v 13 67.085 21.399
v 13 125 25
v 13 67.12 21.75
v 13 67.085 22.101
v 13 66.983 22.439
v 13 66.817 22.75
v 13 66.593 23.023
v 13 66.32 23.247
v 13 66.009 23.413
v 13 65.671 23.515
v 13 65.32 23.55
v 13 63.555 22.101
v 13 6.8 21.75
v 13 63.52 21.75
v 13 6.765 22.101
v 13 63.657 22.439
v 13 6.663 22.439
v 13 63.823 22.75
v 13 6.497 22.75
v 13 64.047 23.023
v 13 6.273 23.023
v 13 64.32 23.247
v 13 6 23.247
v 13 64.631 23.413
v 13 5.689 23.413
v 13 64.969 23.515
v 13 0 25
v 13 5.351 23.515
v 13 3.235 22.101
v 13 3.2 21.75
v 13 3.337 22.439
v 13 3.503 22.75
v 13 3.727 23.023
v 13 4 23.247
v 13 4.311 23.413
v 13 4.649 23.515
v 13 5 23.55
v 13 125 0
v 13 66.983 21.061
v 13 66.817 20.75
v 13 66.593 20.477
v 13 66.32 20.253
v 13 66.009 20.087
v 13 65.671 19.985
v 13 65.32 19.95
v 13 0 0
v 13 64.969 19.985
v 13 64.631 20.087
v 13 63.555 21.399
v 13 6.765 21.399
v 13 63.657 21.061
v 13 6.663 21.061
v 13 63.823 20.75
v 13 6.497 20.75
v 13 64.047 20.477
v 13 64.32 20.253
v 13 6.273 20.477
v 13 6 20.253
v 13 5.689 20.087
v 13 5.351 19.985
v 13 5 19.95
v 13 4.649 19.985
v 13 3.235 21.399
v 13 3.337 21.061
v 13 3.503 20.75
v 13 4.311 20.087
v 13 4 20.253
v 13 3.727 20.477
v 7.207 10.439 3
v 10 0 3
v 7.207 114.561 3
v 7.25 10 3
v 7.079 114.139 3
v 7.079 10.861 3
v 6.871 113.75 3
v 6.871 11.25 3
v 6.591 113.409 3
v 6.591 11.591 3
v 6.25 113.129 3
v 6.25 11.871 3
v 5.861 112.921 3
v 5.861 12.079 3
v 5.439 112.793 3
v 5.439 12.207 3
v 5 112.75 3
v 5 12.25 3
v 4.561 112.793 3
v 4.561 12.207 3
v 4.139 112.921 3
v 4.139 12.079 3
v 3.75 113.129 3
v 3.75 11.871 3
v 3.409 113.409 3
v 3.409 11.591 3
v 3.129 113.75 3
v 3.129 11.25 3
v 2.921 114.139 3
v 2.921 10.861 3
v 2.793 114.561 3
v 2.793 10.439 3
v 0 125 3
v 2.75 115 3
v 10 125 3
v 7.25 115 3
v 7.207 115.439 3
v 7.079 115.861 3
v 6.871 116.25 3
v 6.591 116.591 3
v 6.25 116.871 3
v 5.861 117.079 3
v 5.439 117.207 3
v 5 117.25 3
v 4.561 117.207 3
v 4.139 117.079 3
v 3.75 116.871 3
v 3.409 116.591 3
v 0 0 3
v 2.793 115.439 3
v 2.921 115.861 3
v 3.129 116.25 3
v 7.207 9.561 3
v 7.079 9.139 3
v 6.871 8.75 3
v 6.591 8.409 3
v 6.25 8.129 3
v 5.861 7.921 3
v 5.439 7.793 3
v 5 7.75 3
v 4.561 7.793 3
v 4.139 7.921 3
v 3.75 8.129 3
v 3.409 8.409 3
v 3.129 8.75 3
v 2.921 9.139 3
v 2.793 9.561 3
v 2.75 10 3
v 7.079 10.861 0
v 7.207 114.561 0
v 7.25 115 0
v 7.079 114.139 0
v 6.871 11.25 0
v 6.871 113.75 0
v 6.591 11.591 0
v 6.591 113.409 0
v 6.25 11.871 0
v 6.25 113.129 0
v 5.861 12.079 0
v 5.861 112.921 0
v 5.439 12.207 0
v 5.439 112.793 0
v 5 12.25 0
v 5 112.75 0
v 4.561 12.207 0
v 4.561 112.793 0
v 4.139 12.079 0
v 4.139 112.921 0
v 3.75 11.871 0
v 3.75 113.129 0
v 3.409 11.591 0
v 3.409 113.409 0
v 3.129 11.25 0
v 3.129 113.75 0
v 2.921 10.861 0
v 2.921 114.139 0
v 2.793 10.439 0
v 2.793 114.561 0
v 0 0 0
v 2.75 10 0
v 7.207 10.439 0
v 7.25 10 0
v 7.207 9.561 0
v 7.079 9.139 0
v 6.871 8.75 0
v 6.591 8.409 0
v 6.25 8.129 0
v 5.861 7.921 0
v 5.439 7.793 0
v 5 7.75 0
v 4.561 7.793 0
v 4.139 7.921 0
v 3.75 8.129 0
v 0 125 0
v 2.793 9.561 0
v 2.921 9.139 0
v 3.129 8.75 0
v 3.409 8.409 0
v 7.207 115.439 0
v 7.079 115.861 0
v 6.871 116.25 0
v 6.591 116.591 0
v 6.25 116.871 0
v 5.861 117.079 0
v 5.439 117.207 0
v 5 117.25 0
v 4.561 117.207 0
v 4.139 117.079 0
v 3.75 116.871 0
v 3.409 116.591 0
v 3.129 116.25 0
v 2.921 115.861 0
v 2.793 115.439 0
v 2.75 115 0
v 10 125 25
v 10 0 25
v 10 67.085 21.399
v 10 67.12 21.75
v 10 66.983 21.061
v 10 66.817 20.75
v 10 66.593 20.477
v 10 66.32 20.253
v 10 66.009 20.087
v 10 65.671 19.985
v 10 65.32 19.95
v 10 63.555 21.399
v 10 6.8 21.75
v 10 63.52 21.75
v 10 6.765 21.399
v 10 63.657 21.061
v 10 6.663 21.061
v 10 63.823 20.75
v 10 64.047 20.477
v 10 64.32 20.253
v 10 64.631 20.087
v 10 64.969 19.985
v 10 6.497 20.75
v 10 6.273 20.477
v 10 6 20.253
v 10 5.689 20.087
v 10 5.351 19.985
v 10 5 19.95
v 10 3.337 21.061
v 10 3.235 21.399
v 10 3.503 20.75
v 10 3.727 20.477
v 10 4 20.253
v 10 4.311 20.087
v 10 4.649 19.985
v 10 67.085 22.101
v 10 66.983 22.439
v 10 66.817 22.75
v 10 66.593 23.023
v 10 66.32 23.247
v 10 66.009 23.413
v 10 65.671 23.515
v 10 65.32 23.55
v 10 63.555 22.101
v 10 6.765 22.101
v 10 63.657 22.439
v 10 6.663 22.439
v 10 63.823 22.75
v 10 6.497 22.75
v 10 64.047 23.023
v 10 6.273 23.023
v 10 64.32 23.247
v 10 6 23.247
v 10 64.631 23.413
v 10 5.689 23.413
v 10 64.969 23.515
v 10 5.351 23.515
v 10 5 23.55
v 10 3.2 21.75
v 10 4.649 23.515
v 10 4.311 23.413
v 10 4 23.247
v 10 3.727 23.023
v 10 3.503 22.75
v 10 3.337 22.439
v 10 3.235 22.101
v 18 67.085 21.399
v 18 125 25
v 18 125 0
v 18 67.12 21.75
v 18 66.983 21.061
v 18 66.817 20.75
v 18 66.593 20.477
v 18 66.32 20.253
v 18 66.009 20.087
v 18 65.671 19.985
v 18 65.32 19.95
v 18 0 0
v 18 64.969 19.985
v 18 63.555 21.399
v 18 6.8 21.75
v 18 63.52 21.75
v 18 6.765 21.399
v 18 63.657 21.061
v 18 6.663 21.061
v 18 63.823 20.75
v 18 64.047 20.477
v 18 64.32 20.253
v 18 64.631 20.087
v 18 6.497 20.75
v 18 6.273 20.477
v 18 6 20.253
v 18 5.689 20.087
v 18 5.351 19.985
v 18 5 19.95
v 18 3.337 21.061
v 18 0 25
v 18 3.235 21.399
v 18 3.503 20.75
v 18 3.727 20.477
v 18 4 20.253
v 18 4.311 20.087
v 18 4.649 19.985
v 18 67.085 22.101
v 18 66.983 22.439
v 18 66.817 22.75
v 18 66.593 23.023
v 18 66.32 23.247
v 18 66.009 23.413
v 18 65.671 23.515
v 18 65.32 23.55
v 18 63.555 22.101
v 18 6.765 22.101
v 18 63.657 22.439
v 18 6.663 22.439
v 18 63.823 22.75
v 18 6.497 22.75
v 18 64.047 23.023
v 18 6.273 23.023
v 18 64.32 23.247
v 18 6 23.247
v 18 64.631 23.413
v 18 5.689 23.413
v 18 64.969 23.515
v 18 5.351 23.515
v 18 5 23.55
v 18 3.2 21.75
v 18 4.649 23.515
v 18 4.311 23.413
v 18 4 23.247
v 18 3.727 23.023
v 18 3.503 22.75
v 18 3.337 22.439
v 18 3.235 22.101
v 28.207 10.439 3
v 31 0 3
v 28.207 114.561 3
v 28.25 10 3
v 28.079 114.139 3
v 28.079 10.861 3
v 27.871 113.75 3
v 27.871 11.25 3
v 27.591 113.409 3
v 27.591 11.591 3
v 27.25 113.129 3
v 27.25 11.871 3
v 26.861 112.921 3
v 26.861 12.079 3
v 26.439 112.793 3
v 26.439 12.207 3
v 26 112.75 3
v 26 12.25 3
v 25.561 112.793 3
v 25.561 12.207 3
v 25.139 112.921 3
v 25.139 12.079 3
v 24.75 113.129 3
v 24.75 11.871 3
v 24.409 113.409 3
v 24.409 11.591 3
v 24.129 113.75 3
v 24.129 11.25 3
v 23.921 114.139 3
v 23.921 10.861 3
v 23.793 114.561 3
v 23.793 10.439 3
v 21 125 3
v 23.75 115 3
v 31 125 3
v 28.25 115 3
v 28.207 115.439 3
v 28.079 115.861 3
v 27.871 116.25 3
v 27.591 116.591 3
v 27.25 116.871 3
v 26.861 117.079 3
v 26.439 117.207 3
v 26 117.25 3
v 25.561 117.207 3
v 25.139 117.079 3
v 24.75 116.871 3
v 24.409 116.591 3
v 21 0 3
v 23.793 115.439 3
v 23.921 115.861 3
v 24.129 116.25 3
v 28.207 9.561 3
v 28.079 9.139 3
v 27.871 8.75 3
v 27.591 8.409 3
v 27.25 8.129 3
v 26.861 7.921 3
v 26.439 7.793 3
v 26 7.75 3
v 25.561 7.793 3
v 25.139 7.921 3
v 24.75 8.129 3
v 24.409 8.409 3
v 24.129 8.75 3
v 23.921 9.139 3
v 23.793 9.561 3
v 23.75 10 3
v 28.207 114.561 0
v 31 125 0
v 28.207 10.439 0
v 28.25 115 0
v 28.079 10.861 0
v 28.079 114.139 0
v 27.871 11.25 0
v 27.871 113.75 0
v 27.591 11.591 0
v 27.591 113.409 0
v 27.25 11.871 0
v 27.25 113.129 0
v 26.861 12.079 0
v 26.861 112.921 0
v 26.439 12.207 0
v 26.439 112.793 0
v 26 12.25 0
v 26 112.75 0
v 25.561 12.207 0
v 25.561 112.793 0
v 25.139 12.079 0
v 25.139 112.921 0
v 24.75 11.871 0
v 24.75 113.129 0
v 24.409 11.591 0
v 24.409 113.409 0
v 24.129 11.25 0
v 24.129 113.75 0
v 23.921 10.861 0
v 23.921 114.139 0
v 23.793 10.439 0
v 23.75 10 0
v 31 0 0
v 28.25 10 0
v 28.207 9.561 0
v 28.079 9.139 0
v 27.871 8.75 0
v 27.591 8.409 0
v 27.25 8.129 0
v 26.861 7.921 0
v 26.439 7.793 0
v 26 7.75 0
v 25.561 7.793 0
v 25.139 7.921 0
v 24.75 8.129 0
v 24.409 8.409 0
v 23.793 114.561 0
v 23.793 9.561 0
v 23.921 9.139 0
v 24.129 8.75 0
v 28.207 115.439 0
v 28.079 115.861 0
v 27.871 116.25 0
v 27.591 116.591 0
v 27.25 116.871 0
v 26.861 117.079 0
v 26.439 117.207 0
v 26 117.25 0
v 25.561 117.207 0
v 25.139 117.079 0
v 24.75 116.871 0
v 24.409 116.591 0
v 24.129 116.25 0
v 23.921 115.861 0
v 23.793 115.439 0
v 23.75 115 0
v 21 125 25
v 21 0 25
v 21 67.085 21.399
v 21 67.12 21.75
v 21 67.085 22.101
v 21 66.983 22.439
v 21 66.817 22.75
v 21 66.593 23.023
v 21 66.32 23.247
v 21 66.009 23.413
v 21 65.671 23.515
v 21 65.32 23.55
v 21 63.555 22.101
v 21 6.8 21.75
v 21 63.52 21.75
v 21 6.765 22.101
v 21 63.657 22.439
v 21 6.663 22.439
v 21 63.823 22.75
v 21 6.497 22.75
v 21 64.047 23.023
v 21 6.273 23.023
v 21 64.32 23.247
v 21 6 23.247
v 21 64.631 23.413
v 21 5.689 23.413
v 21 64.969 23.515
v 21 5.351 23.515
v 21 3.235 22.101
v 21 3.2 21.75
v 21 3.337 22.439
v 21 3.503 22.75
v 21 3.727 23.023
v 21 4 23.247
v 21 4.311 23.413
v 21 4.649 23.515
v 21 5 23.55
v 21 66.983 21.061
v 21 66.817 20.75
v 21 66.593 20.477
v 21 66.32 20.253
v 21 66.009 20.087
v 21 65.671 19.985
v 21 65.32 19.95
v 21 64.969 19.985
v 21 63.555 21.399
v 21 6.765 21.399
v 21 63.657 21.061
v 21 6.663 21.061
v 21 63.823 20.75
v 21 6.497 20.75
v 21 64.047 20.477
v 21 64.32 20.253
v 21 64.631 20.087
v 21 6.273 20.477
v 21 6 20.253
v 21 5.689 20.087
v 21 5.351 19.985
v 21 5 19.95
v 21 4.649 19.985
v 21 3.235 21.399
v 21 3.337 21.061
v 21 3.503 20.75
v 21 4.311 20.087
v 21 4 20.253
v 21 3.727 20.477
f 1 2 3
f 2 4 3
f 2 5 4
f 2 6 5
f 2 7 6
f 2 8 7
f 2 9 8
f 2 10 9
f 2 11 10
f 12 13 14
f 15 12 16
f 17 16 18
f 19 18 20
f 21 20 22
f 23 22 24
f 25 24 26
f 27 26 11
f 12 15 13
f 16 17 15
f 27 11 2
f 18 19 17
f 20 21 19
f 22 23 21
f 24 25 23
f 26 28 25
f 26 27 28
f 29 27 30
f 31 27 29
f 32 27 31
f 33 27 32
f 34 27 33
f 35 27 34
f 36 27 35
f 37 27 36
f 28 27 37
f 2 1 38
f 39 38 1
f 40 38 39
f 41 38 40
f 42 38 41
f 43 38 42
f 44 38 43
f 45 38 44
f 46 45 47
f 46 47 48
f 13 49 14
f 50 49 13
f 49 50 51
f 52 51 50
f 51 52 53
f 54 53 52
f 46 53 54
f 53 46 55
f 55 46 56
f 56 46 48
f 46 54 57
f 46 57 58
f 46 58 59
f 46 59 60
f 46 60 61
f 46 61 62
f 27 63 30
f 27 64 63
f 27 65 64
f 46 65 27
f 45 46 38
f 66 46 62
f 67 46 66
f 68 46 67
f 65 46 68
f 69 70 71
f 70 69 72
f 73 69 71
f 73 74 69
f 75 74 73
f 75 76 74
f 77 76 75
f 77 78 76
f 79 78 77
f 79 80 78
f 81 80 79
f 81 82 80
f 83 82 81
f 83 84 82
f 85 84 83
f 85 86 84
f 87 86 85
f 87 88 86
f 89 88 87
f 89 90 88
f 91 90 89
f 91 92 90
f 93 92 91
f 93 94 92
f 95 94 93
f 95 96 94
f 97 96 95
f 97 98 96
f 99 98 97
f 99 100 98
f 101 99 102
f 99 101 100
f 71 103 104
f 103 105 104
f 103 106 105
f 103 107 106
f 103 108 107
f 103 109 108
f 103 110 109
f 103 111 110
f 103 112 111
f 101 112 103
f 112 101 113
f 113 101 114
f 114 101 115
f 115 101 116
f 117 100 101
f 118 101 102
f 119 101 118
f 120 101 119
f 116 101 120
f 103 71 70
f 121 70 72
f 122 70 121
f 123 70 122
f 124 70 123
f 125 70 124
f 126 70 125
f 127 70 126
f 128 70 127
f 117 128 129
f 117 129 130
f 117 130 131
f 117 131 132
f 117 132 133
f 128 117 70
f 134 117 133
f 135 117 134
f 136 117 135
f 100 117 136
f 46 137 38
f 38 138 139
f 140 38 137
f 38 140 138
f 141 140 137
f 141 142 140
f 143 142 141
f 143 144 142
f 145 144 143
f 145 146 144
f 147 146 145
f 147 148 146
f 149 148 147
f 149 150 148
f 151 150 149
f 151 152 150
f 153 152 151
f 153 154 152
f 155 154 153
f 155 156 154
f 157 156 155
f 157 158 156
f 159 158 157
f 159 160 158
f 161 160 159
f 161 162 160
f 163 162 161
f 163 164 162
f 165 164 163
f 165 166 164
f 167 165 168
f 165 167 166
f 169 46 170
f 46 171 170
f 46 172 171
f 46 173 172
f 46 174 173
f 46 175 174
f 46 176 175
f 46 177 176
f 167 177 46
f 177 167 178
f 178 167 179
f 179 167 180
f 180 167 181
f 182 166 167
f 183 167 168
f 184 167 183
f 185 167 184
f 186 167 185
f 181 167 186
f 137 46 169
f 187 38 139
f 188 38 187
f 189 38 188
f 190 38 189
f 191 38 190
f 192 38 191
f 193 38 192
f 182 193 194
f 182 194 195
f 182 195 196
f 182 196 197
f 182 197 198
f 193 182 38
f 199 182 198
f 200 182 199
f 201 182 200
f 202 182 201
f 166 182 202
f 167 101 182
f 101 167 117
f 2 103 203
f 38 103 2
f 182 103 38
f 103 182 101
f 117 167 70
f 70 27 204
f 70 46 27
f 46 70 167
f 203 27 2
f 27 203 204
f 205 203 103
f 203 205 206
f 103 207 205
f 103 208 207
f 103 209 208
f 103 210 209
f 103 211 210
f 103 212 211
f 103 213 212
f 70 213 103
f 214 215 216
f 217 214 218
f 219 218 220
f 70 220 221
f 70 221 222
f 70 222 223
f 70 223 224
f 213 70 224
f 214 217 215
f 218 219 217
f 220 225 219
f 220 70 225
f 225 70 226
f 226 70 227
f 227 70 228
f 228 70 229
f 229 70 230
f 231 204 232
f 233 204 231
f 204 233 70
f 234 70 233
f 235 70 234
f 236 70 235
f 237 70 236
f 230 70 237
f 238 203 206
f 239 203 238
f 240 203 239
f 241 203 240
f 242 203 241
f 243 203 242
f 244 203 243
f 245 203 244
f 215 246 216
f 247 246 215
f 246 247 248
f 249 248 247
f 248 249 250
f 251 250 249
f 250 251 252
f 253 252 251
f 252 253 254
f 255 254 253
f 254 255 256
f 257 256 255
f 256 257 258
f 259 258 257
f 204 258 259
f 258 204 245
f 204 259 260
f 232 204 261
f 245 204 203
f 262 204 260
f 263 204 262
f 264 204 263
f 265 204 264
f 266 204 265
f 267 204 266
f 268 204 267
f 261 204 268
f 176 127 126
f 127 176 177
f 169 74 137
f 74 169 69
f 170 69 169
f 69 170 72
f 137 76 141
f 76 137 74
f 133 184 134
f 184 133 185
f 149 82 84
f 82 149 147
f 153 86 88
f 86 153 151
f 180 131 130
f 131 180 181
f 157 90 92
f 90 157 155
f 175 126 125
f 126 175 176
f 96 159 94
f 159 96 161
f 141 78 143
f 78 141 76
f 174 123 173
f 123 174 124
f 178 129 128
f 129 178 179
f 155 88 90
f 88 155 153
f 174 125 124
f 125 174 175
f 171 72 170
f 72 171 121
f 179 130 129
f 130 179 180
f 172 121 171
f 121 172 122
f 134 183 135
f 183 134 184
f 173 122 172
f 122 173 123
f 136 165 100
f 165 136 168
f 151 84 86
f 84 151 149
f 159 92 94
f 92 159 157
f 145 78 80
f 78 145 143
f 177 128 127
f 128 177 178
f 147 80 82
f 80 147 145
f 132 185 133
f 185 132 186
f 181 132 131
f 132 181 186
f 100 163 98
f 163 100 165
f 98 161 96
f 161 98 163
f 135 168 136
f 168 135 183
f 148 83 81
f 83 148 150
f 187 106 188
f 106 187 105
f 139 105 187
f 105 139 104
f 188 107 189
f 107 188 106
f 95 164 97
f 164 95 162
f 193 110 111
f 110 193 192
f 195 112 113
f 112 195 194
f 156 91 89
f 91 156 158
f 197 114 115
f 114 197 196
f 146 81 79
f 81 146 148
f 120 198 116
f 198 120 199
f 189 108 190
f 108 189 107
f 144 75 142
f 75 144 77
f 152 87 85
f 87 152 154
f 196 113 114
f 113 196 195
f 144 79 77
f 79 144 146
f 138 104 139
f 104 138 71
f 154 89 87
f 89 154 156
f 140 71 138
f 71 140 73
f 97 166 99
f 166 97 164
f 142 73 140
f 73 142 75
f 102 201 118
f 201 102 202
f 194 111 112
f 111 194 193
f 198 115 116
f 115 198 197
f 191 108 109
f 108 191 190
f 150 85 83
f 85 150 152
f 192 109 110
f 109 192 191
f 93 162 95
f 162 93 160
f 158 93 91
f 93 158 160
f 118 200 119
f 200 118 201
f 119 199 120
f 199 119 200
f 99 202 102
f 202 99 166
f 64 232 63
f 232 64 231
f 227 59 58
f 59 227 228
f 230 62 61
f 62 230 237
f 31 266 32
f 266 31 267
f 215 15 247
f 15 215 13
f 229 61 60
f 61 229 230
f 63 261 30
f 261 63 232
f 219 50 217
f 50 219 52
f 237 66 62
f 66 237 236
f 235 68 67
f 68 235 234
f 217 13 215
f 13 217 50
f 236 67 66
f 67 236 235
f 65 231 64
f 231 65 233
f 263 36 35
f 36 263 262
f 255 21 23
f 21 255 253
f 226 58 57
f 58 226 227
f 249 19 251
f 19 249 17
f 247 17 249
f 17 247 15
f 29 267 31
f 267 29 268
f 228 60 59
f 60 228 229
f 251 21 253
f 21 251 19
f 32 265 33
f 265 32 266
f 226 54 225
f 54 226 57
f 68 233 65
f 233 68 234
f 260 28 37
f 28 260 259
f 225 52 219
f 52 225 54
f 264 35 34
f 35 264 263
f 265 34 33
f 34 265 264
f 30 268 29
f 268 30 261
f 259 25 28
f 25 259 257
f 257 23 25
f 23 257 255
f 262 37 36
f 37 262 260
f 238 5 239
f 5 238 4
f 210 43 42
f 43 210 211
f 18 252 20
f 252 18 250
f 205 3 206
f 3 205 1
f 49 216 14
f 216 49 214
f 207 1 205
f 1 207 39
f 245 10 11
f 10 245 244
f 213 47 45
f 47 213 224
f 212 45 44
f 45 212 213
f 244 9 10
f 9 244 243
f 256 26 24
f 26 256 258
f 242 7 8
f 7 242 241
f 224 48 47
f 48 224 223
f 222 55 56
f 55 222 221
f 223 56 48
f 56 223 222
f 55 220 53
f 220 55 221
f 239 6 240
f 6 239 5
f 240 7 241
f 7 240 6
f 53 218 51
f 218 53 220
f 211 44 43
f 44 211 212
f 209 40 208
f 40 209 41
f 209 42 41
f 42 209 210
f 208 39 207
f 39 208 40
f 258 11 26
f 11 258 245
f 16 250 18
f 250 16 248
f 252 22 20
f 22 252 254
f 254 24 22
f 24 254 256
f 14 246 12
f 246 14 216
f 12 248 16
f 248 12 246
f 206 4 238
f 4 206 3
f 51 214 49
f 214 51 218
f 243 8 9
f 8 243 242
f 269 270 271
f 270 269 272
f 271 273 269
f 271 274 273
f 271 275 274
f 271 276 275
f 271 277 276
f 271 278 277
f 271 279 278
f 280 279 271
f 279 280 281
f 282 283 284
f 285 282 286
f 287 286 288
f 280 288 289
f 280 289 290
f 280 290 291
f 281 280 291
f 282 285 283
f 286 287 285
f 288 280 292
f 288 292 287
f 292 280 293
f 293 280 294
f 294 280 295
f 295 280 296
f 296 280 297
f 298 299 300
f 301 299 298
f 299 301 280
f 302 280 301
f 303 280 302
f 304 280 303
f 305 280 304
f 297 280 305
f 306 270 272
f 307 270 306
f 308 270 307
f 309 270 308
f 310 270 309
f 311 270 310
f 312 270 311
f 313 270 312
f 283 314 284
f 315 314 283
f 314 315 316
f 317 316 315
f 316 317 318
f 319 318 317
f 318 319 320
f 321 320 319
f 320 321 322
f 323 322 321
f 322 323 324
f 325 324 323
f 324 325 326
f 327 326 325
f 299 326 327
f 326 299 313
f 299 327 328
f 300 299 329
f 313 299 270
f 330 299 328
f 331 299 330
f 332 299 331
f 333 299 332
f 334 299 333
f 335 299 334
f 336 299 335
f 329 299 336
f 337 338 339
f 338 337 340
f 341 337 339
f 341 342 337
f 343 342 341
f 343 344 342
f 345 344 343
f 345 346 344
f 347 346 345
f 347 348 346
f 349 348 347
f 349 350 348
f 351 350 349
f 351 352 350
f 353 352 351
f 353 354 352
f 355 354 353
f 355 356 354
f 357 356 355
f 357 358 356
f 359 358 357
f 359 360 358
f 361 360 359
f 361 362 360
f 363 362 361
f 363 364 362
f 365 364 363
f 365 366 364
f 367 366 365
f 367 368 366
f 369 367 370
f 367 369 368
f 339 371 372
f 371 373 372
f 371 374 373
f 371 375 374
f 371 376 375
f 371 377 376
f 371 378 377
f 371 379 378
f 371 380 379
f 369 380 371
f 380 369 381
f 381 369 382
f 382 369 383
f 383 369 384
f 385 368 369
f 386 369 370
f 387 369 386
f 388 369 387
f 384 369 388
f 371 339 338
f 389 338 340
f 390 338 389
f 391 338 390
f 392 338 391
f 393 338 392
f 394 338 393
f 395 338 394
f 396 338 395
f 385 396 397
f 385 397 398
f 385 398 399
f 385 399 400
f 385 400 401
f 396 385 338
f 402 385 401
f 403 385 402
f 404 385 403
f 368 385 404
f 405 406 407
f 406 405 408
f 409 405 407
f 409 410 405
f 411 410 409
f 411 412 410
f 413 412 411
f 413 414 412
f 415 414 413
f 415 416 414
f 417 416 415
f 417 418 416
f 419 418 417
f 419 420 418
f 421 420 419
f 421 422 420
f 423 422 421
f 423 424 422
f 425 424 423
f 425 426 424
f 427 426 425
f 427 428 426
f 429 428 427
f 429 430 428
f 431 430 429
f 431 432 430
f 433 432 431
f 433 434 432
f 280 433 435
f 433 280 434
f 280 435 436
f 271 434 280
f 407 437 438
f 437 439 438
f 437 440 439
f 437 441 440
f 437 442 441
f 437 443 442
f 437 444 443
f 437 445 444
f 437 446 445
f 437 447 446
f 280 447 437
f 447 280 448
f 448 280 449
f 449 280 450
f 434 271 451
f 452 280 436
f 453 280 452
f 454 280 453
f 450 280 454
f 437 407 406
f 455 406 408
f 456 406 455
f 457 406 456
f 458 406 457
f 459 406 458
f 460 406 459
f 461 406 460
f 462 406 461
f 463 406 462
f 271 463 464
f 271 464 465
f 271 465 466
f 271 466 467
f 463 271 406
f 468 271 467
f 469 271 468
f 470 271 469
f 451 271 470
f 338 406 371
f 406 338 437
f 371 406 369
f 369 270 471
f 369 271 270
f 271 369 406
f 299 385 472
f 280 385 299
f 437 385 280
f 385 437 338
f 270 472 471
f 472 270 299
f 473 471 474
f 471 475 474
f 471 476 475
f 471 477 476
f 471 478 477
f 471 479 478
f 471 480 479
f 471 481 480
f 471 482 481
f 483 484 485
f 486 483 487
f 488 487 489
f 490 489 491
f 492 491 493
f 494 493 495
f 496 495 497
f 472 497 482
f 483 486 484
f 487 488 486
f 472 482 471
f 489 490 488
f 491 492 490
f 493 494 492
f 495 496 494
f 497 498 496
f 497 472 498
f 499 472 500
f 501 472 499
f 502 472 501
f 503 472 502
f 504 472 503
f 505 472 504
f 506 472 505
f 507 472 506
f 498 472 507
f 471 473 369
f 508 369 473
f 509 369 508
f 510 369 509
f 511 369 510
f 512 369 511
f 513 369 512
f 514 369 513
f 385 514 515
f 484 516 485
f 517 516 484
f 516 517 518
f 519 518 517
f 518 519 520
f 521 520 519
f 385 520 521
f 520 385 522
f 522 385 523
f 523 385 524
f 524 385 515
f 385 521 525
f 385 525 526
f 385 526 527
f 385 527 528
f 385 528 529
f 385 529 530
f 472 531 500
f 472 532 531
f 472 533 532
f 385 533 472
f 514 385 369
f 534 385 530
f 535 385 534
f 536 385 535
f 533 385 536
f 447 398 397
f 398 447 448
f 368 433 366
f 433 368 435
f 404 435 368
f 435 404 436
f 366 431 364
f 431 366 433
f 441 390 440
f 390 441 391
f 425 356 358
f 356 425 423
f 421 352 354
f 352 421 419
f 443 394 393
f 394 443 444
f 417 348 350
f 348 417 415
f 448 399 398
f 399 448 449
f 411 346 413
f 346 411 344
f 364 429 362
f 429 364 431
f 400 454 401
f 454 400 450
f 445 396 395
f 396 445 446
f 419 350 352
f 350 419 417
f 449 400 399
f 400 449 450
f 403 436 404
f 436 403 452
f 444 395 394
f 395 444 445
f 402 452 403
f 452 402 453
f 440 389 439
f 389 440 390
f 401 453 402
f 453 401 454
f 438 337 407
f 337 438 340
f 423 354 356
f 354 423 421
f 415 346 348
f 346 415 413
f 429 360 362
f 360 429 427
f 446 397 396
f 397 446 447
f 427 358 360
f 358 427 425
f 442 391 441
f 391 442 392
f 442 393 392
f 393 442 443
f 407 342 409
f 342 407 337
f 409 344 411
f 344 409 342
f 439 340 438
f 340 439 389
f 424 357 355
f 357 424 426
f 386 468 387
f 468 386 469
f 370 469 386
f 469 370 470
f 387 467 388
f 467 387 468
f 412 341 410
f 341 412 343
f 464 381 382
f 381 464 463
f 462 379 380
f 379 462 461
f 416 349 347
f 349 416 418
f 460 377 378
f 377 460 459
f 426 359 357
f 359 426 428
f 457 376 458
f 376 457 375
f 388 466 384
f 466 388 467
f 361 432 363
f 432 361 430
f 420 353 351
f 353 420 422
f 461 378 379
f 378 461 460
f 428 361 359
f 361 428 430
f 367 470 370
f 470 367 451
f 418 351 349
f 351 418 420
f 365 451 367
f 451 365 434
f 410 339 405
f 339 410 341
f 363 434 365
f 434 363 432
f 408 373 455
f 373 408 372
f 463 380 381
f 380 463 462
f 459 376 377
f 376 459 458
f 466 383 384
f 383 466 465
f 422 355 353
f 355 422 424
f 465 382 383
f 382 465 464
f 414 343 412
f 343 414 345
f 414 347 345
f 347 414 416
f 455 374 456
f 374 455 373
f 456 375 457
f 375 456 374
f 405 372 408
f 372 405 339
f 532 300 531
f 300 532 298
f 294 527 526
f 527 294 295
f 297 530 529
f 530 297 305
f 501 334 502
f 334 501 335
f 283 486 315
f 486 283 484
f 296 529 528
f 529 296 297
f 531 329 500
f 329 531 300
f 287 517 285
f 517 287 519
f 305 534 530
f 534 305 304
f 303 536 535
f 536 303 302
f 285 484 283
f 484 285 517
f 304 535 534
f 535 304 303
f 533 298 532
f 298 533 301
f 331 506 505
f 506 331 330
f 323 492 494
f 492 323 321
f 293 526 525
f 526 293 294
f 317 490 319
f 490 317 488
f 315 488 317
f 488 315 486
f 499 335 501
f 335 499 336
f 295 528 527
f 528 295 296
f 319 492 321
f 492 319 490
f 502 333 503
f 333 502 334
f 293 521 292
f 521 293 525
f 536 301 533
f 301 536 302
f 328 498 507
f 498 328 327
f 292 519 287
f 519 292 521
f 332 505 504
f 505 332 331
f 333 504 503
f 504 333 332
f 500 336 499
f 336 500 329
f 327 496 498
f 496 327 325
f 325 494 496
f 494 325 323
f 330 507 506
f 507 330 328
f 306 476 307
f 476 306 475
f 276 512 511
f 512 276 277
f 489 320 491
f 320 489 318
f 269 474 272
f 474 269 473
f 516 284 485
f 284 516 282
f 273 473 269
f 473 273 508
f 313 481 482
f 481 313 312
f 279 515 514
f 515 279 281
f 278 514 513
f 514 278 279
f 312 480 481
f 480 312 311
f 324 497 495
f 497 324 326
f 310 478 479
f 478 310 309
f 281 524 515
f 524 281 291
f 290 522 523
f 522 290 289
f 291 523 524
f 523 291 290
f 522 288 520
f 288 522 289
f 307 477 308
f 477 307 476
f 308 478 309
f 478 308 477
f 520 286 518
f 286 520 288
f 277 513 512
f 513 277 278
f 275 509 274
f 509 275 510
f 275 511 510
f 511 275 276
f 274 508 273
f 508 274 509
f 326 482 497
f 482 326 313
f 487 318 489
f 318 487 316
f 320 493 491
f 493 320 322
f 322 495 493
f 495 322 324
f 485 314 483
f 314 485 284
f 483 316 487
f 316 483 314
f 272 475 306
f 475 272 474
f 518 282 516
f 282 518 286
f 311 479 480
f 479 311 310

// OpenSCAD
// NCASE M1 HDD Bracket for 3.5" HDD
// 2ピース構成（左右の耳型ブラケット）
// ケースへの取り付け: M4 Flat Head
// HDDの取り付け: #6-32 pan head w/shoulder

// ========================================
// パラメータ定義
// ========================================

// 3.5" HDD 標準寸法
hdd_width = 101.6;      // HDDの幅
hdd_height = 26.1;      // HDDの高さ
hdd_length = 146;       // HDDの長さ

// HDD側面ネジ穴位置 (#6-32)
// 底面から6.35mm、前面からの距離
hdd_screw_height_from_bottom = 6.35;        // HDDの底面からネジ穴までの高さ
hdd_screw_positions = [41.28, 76.20, 101.60]; // 前面からの距離（3箇所）

// HDDの向き設定（ラベル面を外側に向ける場合はtrue）
hdd_label_side_out = true;

// ネジ穴のZ軸オフセット（微調整用）
hdd_screw_z_offset = 2;                     // Z軸方向に追加のオフセット（mm）

// 実際のネジ穴高さを計算
// ラベル面を外側にする場合、HDDを上下逆にするのでネジ穴の高さが変わる
hdd_screw_height = hdd_label_side_out
    ? (hdd_height - hdd_screw_height_from_bottom + hdd_screw_z_offset)  // 逆さ: 上面基準
    : (hdd_screw_height_from_bottom + hdd_screw_z_offset);              // 通常: 底面基準

// ネジ穴直径
m4_hole_diameter = 4.5;       // M4用貫通穴（少し余裕を持たせる）
hdd_screw_hole_diameter = 3.6; // #6-32用貫通穴

// ブラケット寸法
bracket_thickness = 3;        // ブラケットの板厚
bracket_wall_height = 25;     // 側面壁の高さ（HDDを支える部分）
bracket_flange_width = 13;    // ケース取り付け用フランジの幅（2mm削減）

// 120mmファン規格（ケース取り付け穴）
fan_hole_spacing = 105;       // 120mmファンのネジ穴間隔
case_mount_margin_y = 10;     // 端からの距離（Y方向）※5mm→10mmでY軸方向に伸ばす
bracket_length = fan_hole_spacing + case_mount_margin_y * 2;  // 125mm

// ケース取り付け穴の位置（フランジ上）
// 壁の厚みを除いた耳の幅の中央に配置
// 耳の幅（壁を除く）= bracket_flange_width - bracket_thickness = 13 - 3 = 10mm
// その中央 = 10 / 2 = 5mm
case_mount_margin_x = (bracket_flange_width - bracket_thickness) / 2;  // 5mm

// HDD取り付け穴のY軸オフセット
// HDDの前面（SATA端子側）がY=0方向に来るように配置
// HDDの最初の穴は前面から41.28mmの位置にある
hdd_first_hole_offset_y = 5;  // ブラケット端からHDDの最初のネジ穴までの距離（穴がはみ出さないよう調整）

// 表示設定
show_left = true;             // 左ブラケットを表示
show_right = true;            // 右ブラケットを表示
show_hdd_ghost = false;       // HDDのゴースト表示

// ========================================
// 左側ブラケット（耳型）
// ========================================

module left_bracket() {
    difference() {
        union() {
            // フランジ部分（ケース取り付け用、水平）
            cube([bracket_flange_width, bracket_length, bracket_thickness]);

            // 壁部分（HDD取り付け用、垂直）
            translate([bracket_flange_width - bracket_thickness, 0, 0])
                cube([bracket_thickness, bracket_length, bracket_wall_height]);
        }

        // ケース取り付け穴（M4）
        left_case_mount_holes();

        // HDD取り付け穴（#6-32）
        left_hdd_mount_holes();
    }
}

// 左側ブラケットのM4穴
module left_case_mount_holes() {
    positions = [
        [case_mount_margin_x, case_mount_margin_y, 0],
        [case_mount_margin_x, bracket_length - case_mount_margin_y, 0]
    ];

    for (pos = positions) {
        translate(pos)
            cylinder(h = bracket_thickness * 2, d = m4_hole_diameter, center = true, $fn = 32);
    }
}

// 左側ブラケットの#6-32穴
module left_hdd_mount_holes() {
    // HDDの一番遠い2つのネジ穴間隔（41.28mmと101.60mmの差分 = 60.32mm）
    screw_spacing = hdd_screw_positions[2] - hdd_screw_positions[0]; // 60.32mm

    // Y軸方向のネジ穴位置（SATA端子側がY=0方向に来るように配置）
    screw_positions_y = [
        hdd_first_hole_offset_y,                    // 1つ目の穴（前面から41.28mm）
        hdd_first_hole_offset_y + screw_spacing     // 2つ目の穴（前面から101.60mm）
    ];

    for (y = screw_positions_y) {
        translate([bracket_flange_width - bracket_thickness - 1, y, hdd_screw_height])
            rotate([0, 90, 0])
                cylinder(h = bracket_thickness + 2, d = hdd_screw_hole_diameter, $fn = 32);
    }
}

// ========================================
// 右側ブラケット（耳型、左の鏡像）
// ========================================

module right_bracket() {
    mirror([1, 0, 0])
        left_bracket();
}

// ========================================
// レンダリング
// ========================================

// パーツ間の間隔
part_spacing = 5;

// 左右のブラケットを配置（印刷用に並べて表示）
if (show_left) {
    translate([0, 0, 0])
        left_bracket();
}

if (show_right) {
    // 右ブラケットはmirrorで反転しているので、左ブラケットの右端 + 間隔 + 右ブラケットの幅分オフセット
    translate([bracket_flange_width + part_spacing + bracket_flange_width, 0, 0])
        right_bracket();
}

// デバッグ用：HDDのゴースト表示
if (show_hdd_ghost) {
    // 左ブラケットを基準にHDDを配置
    screw_spacing = hdd_screw_positions[1] - hdd_screw_positions[0];
    screw_offset_y = (bracket_length - screw_spacing) / 2;
    hdd_front_y = -hdd_screw_positions[0] + screw_offset_y;

    %translate([bracket_flange_width, hdd_front_y, 0])
        cube([hdd_width, hdd_length, hdd_height]);
}

// ========================================
// 組み立て確認用（コメント解除で使用）
// ========================================

/*
// 実際の取り付け位置で表示
module assembly_view() {
    screw_spacing = hdd_screw_positions[1] - hdd_screw_positions[0];
    screw_offset_y = (bracket_length - screw_spacing) / 2;
    hdd_front_y = -hdd_screw_positions[0] + screw_offset_y;

    // 左ブラケット
    left_bracket();

    // 右ブラケット（HDDの反対側に配置）
    translate([bracket_flange_width + hdd_width + bracket_flange_width, 0, 0])
        right_bracket();

    // HDD（ゴースト）
    %translate([bracket_flange_width, hdd_front_y, 0])
        cube([hdd_width, hdd_length, hdd_height]);
}

assembly_view();
*/
